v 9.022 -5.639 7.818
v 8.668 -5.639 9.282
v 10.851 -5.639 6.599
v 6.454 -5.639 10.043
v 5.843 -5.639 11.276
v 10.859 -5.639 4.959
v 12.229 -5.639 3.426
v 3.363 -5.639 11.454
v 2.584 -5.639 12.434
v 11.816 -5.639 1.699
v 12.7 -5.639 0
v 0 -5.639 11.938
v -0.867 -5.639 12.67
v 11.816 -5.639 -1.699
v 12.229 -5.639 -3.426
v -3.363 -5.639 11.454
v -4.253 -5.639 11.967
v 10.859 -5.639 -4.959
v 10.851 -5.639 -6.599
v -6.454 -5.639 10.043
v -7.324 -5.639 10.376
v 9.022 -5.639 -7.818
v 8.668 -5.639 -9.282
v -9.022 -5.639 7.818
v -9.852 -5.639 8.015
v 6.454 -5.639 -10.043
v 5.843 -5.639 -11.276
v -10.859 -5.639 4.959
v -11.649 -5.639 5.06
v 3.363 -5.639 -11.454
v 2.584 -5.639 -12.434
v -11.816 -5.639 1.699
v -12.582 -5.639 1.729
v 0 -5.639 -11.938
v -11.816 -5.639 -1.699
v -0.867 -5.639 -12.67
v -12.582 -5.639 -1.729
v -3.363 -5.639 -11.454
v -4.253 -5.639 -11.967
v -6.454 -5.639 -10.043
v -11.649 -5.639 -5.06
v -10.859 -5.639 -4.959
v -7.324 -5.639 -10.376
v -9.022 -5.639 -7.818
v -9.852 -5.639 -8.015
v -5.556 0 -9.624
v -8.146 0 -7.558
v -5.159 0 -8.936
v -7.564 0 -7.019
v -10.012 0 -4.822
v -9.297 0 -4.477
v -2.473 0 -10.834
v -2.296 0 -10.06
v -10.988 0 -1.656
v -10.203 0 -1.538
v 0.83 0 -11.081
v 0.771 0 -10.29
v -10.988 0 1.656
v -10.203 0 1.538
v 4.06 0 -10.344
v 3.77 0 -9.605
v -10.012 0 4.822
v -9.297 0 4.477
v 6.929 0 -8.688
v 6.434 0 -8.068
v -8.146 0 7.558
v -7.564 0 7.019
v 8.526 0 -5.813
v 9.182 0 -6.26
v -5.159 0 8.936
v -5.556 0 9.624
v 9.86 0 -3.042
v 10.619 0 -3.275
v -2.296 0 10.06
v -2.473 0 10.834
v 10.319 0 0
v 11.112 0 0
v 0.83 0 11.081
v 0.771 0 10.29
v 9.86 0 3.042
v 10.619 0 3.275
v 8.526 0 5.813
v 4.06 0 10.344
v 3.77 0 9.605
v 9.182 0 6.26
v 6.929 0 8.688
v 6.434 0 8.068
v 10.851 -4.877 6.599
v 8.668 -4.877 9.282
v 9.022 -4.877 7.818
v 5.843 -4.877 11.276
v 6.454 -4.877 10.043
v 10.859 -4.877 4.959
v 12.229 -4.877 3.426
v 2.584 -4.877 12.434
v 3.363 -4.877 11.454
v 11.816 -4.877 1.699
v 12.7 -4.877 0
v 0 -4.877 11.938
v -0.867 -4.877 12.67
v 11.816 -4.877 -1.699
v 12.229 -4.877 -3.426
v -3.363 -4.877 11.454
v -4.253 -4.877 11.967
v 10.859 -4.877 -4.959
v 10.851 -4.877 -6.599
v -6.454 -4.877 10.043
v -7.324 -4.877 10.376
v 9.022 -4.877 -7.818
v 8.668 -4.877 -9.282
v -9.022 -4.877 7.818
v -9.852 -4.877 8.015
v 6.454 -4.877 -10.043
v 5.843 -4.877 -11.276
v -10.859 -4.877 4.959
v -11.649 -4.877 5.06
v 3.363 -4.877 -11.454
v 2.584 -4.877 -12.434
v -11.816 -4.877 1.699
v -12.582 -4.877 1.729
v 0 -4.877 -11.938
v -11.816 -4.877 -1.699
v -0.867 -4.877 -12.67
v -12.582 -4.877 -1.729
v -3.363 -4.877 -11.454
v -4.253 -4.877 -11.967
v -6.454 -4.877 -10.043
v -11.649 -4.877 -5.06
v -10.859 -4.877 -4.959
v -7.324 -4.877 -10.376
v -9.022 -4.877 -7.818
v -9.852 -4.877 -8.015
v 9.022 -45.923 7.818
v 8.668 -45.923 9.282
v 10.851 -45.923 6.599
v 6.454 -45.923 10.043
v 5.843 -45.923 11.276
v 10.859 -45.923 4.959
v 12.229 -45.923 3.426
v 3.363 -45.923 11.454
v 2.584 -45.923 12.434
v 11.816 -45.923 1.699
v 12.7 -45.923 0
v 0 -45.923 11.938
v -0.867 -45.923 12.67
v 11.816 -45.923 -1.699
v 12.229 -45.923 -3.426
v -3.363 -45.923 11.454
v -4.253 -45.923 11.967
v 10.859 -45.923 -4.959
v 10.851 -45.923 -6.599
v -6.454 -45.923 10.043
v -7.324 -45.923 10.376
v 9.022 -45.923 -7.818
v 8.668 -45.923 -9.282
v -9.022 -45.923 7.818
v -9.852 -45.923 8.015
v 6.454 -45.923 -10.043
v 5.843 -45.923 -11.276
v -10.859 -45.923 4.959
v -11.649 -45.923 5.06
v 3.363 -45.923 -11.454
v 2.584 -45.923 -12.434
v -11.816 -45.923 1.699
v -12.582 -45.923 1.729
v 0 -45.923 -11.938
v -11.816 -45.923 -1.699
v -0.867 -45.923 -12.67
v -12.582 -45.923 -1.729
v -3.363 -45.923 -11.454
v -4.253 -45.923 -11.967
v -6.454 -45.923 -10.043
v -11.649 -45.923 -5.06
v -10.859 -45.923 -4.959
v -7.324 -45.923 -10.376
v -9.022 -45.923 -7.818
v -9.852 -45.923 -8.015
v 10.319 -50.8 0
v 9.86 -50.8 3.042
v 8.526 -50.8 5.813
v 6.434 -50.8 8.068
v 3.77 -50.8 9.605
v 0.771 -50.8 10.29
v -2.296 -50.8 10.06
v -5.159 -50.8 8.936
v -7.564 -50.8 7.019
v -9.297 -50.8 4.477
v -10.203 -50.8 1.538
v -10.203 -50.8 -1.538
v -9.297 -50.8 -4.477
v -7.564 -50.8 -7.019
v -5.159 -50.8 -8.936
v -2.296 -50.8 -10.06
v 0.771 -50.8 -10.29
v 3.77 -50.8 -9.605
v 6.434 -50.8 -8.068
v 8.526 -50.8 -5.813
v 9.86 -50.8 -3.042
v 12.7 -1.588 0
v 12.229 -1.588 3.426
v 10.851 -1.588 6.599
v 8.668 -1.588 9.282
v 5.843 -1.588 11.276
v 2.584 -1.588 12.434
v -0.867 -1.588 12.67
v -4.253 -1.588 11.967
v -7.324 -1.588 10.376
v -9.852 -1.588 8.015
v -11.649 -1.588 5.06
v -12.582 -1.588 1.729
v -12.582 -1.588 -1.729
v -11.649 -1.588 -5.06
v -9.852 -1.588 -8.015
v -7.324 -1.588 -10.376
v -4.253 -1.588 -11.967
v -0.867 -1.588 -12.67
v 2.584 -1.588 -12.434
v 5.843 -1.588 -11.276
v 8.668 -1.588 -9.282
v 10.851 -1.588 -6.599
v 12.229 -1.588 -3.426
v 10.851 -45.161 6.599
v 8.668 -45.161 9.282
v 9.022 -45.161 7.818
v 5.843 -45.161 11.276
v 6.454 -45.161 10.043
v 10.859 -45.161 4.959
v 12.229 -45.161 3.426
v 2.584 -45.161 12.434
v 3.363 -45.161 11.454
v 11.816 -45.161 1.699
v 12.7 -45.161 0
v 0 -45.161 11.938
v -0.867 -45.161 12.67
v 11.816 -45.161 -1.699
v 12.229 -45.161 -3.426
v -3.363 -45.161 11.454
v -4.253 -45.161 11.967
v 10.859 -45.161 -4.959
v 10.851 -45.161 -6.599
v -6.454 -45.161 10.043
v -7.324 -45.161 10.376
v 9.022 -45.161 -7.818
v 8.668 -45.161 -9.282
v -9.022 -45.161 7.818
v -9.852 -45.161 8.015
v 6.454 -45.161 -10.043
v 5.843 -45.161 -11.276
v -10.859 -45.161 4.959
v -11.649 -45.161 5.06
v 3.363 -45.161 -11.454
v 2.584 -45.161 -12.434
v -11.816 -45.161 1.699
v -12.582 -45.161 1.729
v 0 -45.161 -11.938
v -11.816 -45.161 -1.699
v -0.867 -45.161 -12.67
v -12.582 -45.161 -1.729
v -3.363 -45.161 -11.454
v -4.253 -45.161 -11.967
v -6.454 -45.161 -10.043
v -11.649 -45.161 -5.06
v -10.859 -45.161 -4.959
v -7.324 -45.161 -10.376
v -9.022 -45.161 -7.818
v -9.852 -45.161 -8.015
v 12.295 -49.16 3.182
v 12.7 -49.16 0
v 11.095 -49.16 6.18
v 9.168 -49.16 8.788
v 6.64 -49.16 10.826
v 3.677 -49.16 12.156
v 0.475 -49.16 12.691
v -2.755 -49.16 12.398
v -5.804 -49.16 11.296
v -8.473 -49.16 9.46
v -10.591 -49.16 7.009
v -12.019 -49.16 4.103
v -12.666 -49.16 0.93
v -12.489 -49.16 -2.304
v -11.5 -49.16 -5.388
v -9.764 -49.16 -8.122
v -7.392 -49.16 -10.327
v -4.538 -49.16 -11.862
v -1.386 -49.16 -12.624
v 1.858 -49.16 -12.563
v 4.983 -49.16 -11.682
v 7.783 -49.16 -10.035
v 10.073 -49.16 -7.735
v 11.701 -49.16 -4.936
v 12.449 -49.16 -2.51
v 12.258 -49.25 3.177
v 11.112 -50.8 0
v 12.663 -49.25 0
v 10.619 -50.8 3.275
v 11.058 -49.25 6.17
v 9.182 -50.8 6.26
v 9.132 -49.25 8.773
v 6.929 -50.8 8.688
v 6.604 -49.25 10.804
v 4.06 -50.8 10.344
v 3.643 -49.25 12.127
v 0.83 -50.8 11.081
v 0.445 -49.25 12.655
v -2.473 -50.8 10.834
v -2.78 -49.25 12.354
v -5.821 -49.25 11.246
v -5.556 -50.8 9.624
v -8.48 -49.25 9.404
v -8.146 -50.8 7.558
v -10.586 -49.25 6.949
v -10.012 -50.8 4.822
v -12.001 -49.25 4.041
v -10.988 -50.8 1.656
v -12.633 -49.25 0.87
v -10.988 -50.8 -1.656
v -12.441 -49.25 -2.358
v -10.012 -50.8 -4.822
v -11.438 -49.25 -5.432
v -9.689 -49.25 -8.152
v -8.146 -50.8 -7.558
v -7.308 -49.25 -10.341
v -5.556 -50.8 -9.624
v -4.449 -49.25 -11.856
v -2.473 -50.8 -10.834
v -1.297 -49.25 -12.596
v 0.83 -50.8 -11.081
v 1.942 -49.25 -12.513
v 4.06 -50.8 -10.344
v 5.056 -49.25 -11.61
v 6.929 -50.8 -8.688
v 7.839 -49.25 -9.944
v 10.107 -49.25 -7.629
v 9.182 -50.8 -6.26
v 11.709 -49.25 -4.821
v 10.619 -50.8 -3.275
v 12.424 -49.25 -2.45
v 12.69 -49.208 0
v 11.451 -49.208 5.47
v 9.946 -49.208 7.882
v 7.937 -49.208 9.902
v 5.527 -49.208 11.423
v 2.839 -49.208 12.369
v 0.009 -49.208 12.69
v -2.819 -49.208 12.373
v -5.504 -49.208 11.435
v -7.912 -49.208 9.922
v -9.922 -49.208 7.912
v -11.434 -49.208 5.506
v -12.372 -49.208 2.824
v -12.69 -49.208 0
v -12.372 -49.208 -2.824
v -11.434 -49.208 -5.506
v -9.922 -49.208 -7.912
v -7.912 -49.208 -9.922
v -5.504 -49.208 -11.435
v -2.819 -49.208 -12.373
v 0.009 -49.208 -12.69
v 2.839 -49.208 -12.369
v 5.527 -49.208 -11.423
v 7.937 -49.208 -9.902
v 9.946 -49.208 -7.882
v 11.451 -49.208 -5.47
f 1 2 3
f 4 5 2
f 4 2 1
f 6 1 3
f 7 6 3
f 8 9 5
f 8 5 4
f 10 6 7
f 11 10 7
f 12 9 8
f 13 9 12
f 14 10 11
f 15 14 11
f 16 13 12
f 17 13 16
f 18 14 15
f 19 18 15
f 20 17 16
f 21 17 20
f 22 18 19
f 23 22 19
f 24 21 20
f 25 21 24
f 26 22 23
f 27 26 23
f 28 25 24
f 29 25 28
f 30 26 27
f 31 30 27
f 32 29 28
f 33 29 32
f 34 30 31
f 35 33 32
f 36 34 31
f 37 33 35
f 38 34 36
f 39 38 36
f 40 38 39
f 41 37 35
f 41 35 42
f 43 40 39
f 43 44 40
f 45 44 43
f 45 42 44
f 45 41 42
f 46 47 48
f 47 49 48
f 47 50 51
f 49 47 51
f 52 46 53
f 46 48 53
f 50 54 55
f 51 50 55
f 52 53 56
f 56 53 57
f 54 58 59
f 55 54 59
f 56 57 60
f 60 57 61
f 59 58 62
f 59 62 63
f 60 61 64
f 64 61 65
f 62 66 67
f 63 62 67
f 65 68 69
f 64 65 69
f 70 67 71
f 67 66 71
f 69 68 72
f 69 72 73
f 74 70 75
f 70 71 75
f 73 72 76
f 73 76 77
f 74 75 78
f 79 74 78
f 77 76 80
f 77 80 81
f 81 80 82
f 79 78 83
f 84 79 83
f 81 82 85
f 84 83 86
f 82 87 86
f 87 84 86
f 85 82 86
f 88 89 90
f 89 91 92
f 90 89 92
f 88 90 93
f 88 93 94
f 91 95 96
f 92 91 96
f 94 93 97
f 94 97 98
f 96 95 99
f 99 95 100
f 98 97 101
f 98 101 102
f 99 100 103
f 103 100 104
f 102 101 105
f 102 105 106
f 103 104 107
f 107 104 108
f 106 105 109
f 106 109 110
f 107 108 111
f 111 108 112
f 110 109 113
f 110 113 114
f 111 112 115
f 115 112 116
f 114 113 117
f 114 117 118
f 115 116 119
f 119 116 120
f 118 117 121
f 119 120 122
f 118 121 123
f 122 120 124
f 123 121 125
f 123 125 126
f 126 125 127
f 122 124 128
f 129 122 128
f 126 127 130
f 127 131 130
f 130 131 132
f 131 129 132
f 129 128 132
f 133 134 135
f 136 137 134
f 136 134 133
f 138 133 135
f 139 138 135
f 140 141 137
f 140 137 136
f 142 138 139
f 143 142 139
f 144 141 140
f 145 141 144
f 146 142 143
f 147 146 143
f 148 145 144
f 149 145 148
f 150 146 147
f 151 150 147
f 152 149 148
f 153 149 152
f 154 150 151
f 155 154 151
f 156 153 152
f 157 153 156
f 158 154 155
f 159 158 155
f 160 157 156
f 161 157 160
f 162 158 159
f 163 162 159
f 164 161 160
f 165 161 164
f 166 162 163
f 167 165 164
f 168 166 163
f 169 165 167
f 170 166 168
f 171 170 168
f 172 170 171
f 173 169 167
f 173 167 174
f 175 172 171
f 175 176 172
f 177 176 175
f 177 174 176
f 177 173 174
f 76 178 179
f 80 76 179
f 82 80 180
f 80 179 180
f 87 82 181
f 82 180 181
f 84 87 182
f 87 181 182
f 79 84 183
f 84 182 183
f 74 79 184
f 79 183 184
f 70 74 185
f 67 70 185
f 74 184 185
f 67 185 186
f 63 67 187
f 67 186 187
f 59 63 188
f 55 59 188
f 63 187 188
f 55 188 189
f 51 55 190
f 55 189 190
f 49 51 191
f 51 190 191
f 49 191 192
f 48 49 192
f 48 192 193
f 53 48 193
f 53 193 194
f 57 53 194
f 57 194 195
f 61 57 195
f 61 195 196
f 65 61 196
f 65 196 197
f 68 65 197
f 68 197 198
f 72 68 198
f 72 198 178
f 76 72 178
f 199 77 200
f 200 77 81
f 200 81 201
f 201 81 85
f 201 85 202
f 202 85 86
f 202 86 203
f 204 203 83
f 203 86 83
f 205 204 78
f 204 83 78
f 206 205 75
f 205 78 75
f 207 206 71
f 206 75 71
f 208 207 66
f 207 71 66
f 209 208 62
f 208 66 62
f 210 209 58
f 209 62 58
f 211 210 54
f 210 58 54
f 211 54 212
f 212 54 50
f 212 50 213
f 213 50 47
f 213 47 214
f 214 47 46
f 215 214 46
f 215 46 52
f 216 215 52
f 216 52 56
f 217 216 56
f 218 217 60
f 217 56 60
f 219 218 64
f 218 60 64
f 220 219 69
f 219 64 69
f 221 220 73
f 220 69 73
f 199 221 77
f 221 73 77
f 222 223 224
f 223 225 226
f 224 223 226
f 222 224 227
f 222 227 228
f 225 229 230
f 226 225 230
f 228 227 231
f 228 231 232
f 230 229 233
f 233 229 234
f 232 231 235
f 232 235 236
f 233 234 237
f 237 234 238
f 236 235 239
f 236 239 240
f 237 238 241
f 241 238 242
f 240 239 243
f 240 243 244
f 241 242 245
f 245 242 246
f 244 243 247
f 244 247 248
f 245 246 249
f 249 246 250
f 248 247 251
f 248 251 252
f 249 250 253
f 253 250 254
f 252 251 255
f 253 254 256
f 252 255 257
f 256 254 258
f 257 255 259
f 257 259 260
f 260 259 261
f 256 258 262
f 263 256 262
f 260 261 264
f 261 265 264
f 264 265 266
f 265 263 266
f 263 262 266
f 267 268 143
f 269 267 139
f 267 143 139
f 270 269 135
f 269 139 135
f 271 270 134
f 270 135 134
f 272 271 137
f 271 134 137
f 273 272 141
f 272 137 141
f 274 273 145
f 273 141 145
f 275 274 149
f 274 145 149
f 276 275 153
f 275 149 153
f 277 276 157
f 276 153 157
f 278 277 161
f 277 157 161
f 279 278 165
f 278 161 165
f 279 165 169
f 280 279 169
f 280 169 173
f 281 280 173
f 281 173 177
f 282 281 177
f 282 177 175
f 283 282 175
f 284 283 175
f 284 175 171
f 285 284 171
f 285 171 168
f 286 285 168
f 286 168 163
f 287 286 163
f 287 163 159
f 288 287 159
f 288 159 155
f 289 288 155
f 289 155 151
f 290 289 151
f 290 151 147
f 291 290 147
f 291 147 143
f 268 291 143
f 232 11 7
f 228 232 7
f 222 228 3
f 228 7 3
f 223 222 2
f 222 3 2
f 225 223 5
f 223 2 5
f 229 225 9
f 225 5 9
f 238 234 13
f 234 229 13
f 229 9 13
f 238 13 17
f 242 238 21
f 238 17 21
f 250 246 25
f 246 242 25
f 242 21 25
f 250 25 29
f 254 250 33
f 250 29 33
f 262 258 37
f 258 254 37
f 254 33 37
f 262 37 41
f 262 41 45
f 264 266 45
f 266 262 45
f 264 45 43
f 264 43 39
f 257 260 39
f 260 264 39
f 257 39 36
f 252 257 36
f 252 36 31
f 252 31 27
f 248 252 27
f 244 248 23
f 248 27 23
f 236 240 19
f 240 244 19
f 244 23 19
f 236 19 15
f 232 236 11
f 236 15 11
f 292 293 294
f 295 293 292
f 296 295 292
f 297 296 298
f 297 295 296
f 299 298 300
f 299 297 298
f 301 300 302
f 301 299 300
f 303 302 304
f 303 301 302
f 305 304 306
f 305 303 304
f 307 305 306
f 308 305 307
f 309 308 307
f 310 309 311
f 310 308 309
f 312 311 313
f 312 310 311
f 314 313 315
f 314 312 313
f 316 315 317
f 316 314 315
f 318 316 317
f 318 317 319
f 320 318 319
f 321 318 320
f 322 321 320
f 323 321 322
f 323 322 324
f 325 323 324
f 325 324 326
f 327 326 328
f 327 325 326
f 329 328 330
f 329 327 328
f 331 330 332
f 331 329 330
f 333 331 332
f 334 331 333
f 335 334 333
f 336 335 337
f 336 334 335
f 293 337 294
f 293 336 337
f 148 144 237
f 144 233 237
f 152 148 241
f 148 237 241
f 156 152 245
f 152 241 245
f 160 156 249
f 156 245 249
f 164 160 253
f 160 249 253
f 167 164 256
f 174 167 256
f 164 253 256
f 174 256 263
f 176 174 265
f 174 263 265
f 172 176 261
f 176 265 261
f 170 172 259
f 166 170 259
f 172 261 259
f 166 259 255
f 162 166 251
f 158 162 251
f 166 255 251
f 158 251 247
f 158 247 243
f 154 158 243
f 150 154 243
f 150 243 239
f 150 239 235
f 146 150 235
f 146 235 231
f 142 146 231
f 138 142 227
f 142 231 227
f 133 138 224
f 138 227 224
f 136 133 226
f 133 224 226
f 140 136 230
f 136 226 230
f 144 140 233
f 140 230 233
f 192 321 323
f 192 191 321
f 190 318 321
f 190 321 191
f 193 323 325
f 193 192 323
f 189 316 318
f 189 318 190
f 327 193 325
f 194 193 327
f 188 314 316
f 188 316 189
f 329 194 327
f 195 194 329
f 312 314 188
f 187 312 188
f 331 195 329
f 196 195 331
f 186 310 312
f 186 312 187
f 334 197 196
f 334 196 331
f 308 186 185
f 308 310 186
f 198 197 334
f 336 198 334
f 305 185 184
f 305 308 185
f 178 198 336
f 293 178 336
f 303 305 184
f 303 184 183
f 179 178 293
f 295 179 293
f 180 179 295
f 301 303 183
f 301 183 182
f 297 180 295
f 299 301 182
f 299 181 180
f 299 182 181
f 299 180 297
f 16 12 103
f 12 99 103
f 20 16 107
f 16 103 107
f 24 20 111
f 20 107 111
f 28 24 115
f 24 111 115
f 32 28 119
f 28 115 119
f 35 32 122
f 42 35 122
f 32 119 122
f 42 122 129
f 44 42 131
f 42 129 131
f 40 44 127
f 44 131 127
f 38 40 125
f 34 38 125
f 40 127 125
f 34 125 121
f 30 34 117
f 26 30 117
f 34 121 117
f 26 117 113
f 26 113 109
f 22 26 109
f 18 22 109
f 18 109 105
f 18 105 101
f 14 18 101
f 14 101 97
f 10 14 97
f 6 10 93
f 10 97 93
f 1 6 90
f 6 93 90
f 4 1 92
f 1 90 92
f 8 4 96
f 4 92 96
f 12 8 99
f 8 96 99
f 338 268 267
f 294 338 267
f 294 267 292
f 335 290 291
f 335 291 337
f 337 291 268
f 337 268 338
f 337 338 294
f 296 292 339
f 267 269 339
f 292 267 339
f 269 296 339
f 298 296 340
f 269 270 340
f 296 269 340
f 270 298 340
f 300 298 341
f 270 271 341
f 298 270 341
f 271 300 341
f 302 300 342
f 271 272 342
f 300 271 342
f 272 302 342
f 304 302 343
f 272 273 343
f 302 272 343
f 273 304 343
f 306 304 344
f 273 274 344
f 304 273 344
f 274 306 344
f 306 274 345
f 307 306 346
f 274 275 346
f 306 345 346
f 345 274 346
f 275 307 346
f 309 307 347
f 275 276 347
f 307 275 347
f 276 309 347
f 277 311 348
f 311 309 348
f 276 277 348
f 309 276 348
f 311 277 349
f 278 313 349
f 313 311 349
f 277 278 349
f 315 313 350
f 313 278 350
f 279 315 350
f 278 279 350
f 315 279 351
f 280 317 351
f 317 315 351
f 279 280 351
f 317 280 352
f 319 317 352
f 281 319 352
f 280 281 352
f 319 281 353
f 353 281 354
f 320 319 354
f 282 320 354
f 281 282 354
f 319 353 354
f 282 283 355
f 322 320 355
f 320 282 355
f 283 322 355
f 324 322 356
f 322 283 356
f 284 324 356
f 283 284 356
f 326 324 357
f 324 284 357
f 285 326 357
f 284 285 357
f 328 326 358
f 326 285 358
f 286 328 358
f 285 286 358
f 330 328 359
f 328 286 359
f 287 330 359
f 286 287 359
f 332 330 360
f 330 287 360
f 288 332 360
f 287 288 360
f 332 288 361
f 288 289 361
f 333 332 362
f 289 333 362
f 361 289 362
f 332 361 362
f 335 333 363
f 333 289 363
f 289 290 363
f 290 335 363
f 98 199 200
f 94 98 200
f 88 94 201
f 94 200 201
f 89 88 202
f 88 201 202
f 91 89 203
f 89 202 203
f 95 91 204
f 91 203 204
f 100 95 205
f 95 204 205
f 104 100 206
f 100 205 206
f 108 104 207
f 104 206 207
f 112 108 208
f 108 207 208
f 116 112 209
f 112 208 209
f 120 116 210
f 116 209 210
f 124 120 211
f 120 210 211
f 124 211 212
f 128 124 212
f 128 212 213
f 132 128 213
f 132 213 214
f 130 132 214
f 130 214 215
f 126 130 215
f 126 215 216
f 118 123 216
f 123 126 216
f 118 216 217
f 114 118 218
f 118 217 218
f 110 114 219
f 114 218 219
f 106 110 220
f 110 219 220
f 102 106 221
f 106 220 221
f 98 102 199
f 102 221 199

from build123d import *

# Parameters (mm, degrees)
F0_R     = 12.7
F1_DEPTH = 50.8
F2_SIZE  = 1.5875
F3_W     = 0.762
F3_H     = 1.8157000701
F6_R     = 0.127
F7_R     = 10.31875
F8_DEPTH = 50.801


with BuildPart() as f1:
    # F0 (on Front) → F1 (new body)
    with BuildSketch(Plane.XZ):
        Circle(F0_R)
    extrude(amount=F1_DEPTH)

    # F2
    f2_edges = [f1.edges().sort_by_distance(p)[0] for p in [
        (-12.7, -50.8, 0),
        (-12.7, 0, 0),
    ]]
    chamfer(f2_edges, length=F2_SIZE)

    # F3 (on Right) → F5 (revolve, cut)
    with BuildSketch(Plane.YZ):
        with Locations((-45.5422, 12.845850035)):
            Rectangle(F3_W, F3_H)
        with Locations((-5.2578, 12.845850035)):
            Rectangle(F3_W, F3_H)
    revolve(axis=Axis((0, -27.9251299798, 0), (0, -1, 0)), mode=Mode.SUBTRACT)

    # F6
    f6_edges = [f1.edges().sort_by_distance(p)[0] for p in [
        (-12.7, -49.2125, 0),
    ]]
    fillet(f6_edges, radius=F6_R)

    # F7 (on face) → F8 (cut, through all)
    with BuildSketch(Plane.XZ.offset(50.8)):
        Circle(F7_R)
    extrude(amount=-F8_DEPTH, mode=Mode.SUBTRACT)


solid = f1.part
